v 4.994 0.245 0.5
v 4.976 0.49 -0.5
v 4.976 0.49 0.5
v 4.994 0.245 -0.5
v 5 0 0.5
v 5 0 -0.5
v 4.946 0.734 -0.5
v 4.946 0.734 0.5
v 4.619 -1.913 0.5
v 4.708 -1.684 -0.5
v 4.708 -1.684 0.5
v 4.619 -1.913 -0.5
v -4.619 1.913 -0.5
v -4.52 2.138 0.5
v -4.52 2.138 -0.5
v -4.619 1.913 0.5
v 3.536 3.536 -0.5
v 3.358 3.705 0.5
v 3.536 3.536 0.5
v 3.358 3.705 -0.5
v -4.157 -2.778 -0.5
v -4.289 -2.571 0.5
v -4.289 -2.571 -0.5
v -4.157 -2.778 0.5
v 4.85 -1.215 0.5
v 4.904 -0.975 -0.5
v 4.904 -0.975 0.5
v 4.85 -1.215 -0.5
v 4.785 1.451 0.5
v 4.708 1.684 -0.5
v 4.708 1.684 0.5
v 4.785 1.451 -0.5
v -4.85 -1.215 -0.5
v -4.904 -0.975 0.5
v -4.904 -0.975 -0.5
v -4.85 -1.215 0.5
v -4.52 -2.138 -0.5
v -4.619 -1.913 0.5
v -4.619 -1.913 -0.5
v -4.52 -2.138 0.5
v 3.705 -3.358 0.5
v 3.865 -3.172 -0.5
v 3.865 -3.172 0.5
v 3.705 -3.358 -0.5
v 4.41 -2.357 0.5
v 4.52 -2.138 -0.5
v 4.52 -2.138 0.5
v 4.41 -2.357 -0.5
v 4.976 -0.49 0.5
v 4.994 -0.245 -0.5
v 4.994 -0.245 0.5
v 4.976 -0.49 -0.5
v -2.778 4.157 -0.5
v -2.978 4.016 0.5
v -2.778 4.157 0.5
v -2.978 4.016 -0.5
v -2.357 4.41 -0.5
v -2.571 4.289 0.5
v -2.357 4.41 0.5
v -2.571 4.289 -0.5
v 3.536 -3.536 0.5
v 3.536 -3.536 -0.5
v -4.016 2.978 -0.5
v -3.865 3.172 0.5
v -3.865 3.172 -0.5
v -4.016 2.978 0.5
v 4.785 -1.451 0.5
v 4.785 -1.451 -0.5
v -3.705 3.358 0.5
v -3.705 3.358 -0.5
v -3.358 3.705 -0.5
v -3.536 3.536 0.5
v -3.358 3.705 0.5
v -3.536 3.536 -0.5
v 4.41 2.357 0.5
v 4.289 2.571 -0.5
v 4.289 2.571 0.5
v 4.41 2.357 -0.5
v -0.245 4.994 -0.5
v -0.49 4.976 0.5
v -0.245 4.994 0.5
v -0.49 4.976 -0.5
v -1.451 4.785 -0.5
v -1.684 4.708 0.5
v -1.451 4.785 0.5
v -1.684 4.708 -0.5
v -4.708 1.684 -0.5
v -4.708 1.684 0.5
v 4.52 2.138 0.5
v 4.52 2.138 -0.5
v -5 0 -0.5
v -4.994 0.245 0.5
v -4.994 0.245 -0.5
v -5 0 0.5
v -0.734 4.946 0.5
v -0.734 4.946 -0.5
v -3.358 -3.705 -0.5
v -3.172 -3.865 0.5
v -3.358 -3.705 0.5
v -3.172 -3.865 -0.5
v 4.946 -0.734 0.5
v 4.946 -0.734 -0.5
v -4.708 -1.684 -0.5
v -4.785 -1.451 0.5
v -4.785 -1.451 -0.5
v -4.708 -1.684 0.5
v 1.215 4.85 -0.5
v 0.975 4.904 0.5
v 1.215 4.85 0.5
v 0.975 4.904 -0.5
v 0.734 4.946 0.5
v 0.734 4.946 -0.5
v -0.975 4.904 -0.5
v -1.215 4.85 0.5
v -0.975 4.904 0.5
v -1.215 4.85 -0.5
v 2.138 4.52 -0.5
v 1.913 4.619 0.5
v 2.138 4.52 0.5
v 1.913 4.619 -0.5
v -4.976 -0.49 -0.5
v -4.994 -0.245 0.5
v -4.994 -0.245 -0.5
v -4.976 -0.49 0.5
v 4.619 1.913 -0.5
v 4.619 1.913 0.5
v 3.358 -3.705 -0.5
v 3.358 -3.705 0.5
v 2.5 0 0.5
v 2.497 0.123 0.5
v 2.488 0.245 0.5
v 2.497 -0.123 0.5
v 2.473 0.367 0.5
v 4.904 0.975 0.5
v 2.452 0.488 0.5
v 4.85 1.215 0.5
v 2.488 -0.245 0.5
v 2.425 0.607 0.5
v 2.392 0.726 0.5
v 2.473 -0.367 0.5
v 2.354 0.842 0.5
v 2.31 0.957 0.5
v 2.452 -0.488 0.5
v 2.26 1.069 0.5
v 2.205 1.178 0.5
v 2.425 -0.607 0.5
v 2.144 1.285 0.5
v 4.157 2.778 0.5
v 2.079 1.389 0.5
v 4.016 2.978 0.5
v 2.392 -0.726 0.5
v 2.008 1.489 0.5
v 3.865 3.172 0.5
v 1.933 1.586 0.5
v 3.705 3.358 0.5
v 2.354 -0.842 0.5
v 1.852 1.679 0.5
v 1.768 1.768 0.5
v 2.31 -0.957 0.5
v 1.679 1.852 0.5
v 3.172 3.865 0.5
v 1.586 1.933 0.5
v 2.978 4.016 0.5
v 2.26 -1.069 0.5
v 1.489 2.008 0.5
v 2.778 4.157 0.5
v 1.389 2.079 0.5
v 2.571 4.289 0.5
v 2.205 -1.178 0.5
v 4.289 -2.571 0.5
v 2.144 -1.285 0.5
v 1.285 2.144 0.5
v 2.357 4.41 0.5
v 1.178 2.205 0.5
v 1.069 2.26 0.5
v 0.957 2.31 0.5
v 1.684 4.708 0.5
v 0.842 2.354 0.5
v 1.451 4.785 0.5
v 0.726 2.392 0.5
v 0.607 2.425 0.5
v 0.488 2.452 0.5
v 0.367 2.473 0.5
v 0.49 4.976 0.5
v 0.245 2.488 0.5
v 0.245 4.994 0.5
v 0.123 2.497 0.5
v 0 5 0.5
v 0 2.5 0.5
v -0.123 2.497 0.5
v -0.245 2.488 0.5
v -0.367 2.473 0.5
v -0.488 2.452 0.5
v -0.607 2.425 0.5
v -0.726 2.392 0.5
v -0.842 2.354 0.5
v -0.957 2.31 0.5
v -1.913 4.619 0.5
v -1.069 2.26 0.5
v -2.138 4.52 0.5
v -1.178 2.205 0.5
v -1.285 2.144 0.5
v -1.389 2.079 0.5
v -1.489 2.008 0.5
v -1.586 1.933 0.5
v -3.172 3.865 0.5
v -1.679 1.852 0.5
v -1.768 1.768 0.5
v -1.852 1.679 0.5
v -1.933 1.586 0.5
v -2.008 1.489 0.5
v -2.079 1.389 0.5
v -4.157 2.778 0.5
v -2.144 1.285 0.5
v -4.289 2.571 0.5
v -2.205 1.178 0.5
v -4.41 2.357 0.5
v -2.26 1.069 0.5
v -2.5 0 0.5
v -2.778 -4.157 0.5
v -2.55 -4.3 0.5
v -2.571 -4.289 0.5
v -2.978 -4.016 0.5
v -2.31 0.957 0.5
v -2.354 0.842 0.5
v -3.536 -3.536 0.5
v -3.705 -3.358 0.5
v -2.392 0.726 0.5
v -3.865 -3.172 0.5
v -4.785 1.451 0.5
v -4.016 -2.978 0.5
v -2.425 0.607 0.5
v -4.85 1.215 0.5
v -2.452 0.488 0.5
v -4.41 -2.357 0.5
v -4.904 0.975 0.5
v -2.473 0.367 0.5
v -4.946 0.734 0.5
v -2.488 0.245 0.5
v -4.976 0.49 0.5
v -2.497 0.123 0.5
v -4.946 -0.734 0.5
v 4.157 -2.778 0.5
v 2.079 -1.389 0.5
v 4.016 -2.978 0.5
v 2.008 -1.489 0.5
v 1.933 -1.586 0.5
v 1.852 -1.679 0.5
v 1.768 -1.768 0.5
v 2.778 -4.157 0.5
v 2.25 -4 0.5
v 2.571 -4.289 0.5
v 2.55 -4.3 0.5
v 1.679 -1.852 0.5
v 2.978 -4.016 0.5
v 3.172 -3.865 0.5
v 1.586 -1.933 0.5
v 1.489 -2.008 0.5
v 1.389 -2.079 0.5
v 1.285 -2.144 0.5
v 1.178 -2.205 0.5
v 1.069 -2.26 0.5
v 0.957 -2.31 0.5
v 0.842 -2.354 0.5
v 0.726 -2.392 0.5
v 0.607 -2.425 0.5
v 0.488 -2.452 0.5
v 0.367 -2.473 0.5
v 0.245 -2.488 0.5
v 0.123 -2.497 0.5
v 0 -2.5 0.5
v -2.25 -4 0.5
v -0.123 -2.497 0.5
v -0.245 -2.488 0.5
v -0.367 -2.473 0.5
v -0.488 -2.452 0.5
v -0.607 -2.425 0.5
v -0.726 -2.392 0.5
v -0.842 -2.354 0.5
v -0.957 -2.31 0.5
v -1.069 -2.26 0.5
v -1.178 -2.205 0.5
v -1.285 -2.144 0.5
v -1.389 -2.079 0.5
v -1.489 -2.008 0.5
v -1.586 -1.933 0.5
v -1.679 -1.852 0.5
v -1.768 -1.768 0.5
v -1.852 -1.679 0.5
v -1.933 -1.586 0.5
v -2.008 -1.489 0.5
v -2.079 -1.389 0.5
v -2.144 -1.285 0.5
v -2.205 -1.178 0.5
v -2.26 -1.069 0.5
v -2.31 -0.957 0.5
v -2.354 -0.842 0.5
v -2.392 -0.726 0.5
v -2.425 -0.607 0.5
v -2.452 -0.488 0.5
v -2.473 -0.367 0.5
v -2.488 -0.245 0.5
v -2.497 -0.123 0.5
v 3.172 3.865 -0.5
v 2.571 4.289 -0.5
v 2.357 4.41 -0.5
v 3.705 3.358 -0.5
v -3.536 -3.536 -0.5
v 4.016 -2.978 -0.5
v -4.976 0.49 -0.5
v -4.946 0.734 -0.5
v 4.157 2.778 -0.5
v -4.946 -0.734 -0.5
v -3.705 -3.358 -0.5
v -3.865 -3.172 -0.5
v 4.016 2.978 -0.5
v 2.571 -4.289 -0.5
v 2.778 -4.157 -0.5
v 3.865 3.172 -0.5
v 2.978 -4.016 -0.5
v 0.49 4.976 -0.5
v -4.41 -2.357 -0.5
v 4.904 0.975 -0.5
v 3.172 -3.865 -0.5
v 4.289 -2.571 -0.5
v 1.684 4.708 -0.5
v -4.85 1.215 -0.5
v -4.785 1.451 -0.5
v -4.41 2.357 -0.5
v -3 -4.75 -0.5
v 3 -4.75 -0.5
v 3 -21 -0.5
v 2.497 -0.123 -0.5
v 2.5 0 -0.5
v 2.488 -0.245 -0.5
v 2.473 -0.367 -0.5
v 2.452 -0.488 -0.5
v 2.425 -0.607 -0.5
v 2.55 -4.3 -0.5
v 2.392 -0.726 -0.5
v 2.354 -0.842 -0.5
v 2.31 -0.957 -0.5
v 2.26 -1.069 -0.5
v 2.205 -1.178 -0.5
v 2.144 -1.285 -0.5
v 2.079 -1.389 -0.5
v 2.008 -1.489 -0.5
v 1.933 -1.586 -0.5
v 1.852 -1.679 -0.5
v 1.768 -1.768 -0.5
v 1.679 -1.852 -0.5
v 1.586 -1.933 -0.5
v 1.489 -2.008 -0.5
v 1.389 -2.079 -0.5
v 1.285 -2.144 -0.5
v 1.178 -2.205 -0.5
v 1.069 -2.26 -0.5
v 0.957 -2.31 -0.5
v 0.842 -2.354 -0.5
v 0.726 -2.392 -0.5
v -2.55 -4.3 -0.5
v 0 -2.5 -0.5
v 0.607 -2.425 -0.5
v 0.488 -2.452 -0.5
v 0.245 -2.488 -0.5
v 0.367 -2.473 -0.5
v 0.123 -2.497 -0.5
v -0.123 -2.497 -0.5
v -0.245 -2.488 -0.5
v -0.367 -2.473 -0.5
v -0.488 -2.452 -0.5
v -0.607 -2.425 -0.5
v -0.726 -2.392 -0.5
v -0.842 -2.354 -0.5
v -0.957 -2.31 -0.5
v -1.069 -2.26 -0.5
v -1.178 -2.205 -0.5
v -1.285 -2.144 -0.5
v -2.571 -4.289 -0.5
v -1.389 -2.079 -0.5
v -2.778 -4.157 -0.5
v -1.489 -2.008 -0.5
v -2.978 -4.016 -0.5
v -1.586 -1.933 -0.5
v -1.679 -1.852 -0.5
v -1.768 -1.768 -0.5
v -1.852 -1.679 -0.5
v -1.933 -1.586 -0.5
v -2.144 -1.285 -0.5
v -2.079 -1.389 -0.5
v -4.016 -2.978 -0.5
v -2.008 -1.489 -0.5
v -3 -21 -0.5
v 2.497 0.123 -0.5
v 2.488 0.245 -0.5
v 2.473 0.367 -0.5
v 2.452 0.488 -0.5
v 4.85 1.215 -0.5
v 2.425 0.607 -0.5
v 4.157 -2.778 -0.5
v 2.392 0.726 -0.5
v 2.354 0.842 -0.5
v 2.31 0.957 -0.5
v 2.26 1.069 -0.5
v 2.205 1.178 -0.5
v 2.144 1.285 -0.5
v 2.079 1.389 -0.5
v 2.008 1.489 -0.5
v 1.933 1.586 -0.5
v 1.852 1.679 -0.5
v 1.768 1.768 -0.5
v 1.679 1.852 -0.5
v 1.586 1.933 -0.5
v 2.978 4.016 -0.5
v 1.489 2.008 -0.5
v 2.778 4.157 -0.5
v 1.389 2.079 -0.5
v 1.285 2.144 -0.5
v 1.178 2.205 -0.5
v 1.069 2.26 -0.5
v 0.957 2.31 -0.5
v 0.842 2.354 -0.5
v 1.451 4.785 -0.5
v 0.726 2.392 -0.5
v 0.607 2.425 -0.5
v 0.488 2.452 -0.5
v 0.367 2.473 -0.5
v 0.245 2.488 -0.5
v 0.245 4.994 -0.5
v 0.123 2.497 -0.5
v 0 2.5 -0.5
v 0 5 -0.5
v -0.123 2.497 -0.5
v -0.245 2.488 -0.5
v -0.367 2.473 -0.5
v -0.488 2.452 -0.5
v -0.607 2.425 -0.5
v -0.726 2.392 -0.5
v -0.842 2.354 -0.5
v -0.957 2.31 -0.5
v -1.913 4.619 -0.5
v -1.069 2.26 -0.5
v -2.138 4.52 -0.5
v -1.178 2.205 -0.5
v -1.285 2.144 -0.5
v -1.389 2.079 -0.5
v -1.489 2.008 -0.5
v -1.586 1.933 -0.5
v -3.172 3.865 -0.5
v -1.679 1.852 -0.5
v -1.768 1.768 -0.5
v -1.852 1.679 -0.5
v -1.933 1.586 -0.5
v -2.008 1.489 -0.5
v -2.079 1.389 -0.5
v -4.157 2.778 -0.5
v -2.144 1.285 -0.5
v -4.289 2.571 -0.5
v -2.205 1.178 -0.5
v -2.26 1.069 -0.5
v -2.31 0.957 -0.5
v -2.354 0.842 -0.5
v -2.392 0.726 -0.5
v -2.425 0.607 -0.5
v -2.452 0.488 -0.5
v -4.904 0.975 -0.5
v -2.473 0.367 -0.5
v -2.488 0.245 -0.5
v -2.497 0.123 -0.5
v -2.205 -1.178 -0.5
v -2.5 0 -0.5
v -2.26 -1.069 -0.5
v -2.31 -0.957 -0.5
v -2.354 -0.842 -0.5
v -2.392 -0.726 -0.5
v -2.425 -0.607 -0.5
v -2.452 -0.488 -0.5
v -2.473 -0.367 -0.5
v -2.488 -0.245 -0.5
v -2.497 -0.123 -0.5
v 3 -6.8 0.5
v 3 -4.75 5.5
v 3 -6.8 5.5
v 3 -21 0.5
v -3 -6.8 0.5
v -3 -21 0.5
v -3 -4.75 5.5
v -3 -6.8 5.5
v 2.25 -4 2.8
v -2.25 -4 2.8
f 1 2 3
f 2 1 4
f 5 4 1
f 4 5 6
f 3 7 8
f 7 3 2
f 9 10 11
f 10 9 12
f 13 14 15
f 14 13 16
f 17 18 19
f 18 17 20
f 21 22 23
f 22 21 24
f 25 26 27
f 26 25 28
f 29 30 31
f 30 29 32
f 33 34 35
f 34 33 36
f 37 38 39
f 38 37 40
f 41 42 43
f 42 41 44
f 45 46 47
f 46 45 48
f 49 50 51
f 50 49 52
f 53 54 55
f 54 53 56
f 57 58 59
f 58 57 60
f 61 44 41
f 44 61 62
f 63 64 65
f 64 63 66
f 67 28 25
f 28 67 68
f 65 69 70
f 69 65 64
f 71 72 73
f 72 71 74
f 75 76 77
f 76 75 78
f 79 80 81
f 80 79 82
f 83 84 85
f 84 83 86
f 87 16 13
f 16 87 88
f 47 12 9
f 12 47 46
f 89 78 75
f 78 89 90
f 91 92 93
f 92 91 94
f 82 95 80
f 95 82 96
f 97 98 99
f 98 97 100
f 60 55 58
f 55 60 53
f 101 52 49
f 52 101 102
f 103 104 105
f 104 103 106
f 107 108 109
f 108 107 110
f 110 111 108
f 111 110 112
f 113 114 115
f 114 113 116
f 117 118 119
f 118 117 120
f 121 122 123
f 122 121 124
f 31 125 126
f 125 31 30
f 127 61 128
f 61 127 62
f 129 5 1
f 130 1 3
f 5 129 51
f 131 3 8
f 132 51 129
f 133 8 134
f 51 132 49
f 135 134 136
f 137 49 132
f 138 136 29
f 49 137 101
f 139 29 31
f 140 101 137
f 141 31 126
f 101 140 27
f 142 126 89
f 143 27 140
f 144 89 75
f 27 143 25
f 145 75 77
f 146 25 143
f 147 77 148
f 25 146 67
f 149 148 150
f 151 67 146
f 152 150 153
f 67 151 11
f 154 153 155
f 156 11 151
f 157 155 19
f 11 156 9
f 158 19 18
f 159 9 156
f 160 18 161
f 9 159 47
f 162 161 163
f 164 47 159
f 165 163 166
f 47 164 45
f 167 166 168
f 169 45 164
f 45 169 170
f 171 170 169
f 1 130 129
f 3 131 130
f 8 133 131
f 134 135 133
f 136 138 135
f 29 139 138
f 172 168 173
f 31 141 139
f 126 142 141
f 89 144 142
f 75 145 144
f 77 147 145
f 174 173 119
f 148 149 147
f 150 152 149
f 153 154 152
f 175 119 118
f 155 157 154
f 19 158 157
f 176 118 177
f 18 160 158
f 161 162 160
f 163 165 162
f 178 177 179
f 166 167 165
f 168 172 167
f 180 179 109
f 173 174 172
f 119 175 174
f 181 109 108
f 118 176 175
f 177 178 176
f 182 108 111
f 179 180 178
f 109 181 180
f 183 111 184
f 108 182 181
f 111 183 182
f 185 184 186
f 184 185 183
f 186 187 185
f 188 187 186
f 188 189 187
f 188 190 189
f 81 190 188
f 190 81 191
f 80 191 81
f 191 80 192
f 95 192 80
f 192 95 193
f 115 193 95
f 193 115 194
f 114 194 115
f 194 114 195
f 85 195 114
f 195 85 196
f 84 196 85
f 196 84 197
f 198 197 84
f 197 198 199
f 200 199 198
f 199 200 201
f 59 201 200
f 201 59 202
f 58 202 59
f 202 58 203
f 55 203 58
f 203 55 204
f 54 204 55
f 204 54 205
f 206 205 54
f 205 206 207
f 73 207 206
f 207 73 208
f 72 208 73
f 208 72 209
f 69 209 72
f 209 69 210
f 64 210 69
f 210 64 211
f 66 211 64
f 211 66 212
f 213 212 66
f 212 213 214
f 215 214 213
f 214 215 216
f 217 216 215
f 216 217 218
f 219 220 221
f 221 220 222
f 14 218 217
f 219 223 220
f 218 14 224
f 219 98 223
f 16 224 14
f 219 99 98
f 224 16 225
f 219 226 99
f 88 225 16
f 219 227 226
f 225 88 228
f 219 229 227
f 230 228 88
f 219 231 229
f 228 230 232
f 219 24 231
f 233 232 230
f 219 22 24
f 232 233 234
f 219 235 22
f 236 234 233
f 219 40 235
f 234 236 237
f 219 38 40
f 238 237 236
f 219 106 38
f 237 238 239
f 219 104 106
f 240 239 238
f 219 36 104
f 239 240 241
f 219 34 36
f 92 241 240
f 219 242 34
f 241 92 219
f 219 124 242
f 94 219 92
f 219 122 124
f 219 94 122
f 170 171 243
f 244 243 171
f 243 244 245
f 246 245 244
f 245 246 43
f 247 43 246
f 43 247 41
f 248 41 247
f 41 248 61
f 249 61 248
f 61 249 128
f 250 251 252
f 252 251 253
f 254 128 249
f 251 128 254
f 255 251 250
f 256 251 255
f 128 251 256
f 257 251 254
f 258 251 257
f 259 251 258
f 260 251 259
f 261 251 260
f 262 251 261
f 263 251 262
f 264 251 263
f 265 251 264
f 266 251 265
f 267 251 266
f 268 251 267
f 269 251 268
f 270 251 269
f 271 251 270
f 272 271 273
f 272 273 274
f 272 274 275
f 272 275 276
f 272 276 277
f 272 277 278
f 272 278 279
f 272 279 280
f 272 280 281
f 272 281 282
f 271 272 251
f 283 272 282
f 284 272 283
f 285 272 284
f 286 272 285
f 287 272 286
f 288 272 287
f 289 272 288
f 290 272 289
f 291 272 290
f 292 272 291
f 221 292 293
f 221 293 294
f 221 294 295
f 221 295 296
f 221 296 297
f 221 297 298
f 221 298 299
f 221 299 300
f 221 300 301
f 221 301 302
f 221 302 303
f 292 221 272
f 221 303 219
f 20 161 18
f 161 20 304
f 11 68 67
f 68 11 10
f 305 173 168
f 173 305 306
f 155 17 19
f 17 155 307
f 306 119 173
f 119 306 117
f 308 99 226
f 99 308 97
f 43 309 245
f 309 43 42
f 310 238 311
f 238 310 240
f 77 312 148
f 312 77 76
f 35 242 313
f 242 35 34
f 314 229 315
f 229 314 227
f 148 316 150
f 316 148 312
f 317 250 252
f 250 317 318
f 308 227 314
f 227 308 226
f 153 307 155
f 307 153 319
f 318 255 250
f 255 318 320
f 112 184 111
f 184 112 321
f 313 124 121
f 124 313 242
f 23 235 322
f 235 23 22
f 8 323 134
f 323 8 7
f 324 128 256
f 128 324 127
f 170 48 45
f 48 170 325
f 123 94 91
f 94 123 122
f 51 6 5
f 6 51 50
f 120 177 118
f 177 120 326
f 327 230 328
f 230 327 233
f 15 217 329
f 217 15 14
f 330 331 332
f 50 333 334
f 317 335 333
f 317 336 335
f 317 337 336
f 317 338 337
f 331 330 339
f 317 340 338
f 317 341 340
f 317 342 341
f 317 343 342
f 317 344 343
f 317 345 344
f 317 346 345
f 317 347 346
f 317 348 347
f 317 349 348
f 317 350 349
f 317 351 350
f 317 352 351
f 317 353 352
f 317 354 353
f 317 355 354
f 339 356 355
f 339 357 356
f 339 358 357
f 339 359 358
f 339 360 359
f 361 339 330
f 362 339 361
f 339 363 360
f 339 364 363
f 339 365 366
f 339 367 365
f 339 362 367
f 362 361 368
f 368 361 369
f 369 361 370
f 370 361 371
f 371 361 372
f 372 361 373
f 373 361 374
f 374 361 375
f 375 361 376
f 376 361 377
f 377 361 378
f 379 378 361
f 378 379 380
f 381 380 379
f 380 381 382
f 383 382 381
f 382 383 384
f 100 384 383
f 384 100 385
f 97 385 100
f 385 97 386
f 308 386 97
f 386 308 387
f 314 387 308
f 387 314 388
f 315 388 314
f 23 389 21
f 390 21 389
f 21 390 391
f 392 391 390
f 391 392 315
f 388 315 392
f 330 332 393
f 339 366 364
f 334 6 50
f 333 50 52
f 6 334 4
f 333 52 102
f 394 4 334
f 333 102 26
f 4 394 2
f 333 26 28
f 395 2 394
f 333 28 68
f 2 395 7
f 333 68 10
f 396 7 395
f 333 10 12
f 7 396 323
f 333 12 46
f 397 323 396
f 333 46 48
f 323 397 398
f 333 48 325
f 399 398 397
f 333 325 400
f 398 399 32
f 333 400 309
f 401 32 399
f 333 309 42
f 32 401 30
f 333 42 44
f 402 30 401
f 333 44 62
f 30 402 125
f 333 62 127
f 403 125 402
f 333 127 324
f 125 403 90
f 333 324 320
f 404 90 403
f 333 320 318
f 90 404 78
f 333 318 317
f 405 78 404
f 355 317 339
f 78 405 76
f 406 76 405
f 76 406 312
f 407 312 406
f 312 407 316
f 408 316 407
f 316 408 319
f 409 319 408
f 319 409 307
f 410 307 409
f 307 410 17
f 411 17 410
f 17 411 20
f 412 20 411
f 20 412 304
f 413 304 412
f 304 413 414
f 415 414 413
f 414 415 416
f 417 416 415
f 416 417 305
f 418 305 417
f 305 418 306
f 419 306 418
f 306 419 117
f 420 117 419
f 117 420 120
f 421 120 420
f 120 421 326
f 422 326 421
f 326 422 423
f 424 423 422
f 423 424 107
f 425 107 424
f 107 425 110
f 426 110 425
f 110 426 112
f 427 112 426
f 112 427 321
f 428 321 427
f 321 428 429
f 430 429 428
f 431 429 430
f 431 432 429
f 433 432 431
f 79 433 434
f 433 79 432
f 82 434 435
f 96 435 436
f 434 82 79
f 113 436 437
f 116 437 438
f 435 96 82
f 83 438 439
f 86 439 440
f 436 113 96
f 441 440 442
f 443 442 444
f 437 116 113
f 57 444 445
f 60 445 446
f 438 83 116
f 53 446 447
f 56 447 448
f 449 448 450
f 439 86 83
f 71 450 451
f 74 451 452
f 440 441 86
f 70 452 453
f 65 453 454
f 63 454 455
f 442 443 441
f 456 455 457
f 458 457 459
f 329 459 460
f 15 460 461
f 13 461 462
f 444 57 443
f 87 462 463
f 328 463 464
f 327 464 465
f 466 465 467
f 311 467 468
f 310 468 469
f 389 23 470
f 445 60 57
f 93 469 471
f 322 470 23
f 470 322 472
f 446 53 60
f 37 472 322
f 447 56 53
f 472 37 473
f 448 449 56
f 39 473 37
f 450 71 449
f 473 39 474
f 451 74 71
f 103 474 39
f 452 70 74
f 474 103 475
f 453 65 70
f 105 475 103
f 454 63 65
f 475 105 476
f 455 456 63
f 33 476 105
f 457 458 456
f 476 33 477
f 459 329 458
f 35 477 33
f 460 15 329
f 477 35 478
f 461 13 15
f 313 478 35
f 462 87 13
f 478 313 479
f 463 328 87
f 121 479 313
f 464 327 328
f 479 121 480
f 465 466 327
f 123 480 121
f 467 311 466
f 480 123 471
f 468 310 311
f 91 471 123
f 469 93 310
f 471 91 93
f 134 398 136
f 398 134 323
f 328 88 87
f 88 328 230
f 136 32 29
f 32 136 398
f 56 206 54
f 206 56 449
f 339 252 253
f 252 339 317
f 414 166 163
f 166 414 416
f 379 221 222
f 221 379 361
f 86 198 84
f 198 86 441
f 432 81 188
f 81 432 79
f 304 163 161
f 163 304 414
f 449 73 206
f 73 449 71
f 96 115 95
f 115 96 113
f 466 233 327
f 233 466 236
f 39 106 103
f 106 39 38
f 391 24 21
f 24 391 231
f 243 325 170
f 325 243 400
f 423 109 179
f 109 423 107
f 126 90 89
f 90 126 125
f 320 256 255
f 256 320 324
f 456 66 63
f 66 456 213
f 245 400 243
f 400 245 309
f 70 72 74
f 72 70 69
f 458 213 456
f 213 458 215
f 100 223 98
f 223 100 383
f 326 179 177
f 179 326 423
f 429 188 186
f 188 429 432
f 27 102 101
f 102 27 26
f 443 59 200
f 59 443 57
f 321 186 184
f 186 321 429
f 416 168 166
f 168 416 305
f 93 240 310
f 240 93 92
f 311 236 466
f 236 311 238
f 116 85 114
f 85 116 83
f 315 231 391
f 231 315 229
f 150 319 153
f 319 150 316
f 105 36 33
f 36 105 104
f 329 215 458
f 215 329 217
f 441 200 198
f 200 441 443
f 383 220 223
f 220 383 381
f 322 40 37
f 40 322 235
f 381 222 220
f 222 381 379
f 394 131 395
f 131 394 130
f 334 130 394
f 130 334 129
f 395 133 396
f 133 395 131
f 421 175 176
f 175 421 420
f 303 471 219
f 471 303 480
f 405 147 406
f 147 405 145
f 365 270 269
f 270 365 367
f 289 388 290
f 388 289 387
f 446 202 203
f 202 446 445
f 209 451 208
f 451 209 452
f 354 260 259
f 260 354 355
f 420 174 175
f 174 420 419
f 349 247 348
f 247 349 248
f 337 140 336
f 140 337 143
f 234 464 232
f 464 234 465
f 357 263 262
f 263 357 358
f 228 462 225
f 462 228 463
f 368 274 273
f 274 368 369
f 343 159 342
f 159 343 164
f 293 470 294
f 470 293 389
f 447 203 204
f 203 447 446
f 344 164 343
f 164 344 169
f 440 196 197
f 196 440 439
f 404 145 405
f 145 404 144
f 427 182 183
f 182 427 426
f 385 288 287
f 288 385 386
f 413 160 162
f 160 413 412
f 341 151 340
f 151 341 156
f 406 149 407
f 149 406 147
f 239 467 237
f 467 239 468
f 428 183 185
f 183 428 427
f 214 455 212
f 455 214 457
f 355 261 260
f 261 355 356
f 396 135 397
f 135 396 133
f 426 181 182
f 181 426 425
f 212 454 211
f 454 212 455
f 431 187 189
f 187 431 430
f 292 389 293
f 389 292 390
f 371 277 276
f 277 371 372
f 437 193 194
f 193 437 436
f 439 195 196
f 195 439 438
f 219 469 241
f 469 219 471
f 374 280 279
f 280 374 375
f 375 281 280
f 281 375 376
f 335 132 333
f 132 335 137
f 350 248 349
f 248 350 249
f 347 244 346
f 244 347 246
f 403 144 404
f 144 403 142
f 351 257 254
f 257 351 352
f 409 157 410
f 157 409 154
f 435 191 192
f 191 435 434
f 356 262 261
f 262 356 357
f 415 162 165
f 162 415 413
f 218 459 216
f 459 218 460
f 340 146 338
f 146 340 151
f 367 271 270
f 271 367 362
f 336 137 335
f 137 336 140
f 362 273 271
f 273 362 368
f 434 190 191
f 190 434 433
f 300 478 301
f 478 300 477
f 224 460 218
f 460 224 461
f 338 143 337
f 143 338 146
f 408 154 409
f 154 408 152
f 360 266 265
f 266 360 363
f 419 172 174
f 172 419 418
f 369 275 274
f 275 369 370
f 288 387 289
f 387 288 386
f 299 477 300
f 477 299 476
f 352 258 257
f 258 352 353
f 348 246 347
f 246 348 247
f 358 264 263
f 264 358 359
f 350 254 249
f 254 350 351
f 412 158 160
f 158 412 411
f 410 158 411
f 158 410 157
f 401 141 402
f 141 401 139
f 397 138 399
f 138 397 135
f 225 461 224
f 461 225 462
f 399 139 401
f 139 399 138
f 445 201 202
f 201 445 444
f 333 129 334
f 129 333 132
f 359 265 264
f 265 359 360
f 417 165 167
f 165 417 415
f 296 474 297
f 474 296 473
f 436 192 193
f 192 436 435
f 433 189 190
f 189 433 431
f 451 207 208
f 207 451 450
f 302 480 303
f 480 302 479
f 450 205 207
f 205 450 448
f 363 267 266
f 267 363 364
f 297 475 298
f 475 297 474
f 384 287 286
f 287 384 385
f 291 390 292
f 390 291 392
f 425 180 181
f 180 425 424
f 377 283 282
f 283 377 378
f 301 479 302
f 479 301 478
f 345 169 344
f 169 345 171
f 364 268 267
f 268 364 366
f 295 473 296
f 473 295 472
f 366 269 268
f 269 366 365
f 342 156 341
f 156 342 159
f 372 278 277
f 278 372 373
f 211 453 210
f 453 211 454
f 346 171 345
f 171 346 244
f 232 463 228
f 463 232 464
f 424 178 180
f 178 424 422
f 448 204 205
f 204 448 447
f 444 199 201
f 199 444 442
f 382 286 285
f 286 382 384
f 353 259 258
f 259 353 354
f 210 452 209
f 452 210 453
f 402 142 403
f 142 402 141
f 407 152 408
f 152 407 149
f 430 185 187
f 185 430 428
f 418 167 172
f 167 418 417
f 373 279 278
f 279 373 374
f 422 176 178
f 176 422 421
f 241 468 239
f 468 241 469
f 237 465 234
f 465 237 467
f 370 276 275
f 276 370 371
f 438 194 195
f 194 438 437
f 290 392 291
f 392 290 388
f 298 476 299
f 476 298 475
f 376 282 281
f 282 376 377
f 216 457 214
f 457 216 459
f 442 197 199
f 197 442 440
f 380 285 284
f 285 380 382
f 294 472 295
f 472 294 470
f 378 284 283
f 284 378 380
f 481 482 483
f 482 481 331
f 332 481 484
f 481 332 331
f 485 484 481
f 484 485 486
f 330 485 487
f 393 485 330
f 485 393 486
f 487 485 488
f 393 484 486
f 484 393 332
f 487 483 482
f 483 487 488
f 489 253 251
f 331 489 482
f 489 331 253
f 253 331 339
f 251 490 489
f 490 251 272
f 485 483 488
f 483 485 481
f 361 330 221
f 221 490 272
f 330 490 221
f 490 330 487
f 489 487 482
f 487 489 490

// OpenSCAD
// Ring terminal (connected solid, smooth hole, detailed neck/barrel transition)

// Parameters
outer_diameter_od = 10; //[5:20:0.5]
inner_diameter_id = 5; //[2.5:10:0.5]
thickness_t = 1; //[0.5:2:0.1]
width_w = 6; //[3:12:0.5]
overall_length_l = 20; //[10:40:1]
crimp_length = 0; //[0:30:1]
bend_angle_deg = 45; //[0:90:1]
transition_length = 1; //[0.5:3:0.1]
wire_hole_diameter = 0; //[0:8:0.5]
overlap_eps = 1; //[0.5:2:0.1]
cut_slot_width = 0.8; //[0.4:2:0.1]
cut_slot_extra = 2; //[1:6:0.5]

$fn = 128;

// Helpers
function clamp(x, a, b) = min(max(x, a), b);

module ring_terminal_assembly() {
    // Derived dimensions (ensure valid)
    od = max(outer_diameter_od, inner_diameter_id + 2*thickness_t + 0.2);
    id = min(inner_diameter_id, od - 2*thickness_t - 0.2);
    t  = thickness_t;
    w  = width_w;

    ring_r_out = od/2;
    ring_r_in  = id/2;

    // Tongue length from ring tangent to end
    tongue_len = max(overall_length_l - ring_r_out, w*0.8);

    // Neck/transition sizing (adds detail vs a simple block)
    neck_len = max(transition_length, t*1.5);
    neck_w   = clamp(w*0.75, t*2.0, w);
    neck_h   = clamp(w*0.55, t*2.0, w);

    // Barrel sizing
    barrel_len = max(crimp_length, 0);
    barrel_r_out = w/2;
    barrel_r_in  = max(barrel_r_out - t, t*0.6);

    // Coordinate system:
    // Ring center at origin. Tongue extends in -Y direction.
    // Plate centered at z=0 (thickness along Z).
    z0 = 0;

    // Key Y positions
    y_ring_center = 0;
    y_ring_tangent = -ring_r_out;                 // where tongue meets ring
    y_tongue_end = y_ring_tangent - tongue_len;   // far end of tongue

    // Place tongue so its top edge touches ring tangent with overlap
    y_tongue_center = (y_ring_tangent - tongue_len/2) - overlap_eps/2;

    // Neck sits at the tongue start (near ring), centered slightly into tongue
    y_neck_center = y_ring_tangent - neck_len/2 + overlap_eps/2;

    // Barrel sits after neck, further down the tongue
    y_barrel_center = y_ring_tangent - neck_len - barrel_len/2 + overlap_eps/2;

    // Build as one connected solid, then subtract holes/slots
    difference() {
        union() {
            // Ring (washer)
            difference() {
                cylinder(r=ring_r_out, h=t, center=true);
                cylinder(r=ring_r_in,  h=t + 2*overlap_eps, center=true);
            }

            // Tongue plate (flat)
            translate([0, y_tongue_center, z0])
                cube([w, tongue_len + overlap_eps, t], center=true);

            // Detailed neck/transition: hull between tongue and barrel profile
            // This creates a smoother, more realistic transition than a simple block.
            hull() {
                // Near ring: slightly narrower and lower neck block
                translate([0, y_neck_center + neck_len*0.15, z0 + (neck_h - t)/2])
                    cube([neck_w, neck_len*0.7 + overlap_eps, neck_h], center=true);

                // Toward barrel: approach barrel diameter
                translate([0, y_neck_center - neck_len*0.35, z0 + (w - t)/2])
                    cube([w, neck_len*0.7 + overlap_eps, w], center=true);
            }

            // Crimp barrel shell (optional)
            if (barrel_len > 0) {
                // Outer barrel
                translate([0, y_barrel_center, z0 + (w - t)/2])
                    rotate([90, 0, 0])
                        cylinder(r=barrel_r_out, h=barrel_len + overlap_eps, center=true);

                // Blend from neck to barrel with a short hull (adds detail)
                hull() {
                    translate([0, y_ring_tangent - neck_len + overlap_eps/2, z0 + (w - t)/2])
                        cube([w, overlap_eps, w], center=true);
                    translate([0, y_ring_tangent - neck_len - min(barrel_len, w*0.6)/2 + overlap_eps/2, z0 + (w - t)/2])
                        rotate([90, 0, 0])
                            cylinder(r=barrel_r_out, h=min(barrel_len, w*0.6) + overlap_eps, center=true);
                }
            }
        }

        // Optional wire hole in tongue end (through thickness)
        if (wire_hole_diameter > 0) {
            translate([0, y_tongue_end + w*0.6, z0])
                cylinder(r=wire_hole_diameter/2, h=t + 2*overlap_eps, center=true);
        }

        // Crimp barrel inner void + seam slot (optional)
        if (barrel_len > 0) {
            // Inner void
            translate([0, y_barrel_center, z0 + (w - t)/2])
                rotate([90, 0, 0])
                    cylinder(r=barrel_r_in, h=barrel_len + 2*overlap_eps, center=true);

            // Slot cut along barrel length (connects to inner void)
            slot_len = barrel_len + neck_len + cut_slot_extra;
            translate([0,
                       (y_ring_tangent - neck_len) - slot_len/2 + overlap_eps/2,
                       z0 + (w - t)/2])
                cube([cut_slot_width, slot_len, w + 2*overlap_eps], center=true);
        }
    }
}

ring_terminal_assembly();
